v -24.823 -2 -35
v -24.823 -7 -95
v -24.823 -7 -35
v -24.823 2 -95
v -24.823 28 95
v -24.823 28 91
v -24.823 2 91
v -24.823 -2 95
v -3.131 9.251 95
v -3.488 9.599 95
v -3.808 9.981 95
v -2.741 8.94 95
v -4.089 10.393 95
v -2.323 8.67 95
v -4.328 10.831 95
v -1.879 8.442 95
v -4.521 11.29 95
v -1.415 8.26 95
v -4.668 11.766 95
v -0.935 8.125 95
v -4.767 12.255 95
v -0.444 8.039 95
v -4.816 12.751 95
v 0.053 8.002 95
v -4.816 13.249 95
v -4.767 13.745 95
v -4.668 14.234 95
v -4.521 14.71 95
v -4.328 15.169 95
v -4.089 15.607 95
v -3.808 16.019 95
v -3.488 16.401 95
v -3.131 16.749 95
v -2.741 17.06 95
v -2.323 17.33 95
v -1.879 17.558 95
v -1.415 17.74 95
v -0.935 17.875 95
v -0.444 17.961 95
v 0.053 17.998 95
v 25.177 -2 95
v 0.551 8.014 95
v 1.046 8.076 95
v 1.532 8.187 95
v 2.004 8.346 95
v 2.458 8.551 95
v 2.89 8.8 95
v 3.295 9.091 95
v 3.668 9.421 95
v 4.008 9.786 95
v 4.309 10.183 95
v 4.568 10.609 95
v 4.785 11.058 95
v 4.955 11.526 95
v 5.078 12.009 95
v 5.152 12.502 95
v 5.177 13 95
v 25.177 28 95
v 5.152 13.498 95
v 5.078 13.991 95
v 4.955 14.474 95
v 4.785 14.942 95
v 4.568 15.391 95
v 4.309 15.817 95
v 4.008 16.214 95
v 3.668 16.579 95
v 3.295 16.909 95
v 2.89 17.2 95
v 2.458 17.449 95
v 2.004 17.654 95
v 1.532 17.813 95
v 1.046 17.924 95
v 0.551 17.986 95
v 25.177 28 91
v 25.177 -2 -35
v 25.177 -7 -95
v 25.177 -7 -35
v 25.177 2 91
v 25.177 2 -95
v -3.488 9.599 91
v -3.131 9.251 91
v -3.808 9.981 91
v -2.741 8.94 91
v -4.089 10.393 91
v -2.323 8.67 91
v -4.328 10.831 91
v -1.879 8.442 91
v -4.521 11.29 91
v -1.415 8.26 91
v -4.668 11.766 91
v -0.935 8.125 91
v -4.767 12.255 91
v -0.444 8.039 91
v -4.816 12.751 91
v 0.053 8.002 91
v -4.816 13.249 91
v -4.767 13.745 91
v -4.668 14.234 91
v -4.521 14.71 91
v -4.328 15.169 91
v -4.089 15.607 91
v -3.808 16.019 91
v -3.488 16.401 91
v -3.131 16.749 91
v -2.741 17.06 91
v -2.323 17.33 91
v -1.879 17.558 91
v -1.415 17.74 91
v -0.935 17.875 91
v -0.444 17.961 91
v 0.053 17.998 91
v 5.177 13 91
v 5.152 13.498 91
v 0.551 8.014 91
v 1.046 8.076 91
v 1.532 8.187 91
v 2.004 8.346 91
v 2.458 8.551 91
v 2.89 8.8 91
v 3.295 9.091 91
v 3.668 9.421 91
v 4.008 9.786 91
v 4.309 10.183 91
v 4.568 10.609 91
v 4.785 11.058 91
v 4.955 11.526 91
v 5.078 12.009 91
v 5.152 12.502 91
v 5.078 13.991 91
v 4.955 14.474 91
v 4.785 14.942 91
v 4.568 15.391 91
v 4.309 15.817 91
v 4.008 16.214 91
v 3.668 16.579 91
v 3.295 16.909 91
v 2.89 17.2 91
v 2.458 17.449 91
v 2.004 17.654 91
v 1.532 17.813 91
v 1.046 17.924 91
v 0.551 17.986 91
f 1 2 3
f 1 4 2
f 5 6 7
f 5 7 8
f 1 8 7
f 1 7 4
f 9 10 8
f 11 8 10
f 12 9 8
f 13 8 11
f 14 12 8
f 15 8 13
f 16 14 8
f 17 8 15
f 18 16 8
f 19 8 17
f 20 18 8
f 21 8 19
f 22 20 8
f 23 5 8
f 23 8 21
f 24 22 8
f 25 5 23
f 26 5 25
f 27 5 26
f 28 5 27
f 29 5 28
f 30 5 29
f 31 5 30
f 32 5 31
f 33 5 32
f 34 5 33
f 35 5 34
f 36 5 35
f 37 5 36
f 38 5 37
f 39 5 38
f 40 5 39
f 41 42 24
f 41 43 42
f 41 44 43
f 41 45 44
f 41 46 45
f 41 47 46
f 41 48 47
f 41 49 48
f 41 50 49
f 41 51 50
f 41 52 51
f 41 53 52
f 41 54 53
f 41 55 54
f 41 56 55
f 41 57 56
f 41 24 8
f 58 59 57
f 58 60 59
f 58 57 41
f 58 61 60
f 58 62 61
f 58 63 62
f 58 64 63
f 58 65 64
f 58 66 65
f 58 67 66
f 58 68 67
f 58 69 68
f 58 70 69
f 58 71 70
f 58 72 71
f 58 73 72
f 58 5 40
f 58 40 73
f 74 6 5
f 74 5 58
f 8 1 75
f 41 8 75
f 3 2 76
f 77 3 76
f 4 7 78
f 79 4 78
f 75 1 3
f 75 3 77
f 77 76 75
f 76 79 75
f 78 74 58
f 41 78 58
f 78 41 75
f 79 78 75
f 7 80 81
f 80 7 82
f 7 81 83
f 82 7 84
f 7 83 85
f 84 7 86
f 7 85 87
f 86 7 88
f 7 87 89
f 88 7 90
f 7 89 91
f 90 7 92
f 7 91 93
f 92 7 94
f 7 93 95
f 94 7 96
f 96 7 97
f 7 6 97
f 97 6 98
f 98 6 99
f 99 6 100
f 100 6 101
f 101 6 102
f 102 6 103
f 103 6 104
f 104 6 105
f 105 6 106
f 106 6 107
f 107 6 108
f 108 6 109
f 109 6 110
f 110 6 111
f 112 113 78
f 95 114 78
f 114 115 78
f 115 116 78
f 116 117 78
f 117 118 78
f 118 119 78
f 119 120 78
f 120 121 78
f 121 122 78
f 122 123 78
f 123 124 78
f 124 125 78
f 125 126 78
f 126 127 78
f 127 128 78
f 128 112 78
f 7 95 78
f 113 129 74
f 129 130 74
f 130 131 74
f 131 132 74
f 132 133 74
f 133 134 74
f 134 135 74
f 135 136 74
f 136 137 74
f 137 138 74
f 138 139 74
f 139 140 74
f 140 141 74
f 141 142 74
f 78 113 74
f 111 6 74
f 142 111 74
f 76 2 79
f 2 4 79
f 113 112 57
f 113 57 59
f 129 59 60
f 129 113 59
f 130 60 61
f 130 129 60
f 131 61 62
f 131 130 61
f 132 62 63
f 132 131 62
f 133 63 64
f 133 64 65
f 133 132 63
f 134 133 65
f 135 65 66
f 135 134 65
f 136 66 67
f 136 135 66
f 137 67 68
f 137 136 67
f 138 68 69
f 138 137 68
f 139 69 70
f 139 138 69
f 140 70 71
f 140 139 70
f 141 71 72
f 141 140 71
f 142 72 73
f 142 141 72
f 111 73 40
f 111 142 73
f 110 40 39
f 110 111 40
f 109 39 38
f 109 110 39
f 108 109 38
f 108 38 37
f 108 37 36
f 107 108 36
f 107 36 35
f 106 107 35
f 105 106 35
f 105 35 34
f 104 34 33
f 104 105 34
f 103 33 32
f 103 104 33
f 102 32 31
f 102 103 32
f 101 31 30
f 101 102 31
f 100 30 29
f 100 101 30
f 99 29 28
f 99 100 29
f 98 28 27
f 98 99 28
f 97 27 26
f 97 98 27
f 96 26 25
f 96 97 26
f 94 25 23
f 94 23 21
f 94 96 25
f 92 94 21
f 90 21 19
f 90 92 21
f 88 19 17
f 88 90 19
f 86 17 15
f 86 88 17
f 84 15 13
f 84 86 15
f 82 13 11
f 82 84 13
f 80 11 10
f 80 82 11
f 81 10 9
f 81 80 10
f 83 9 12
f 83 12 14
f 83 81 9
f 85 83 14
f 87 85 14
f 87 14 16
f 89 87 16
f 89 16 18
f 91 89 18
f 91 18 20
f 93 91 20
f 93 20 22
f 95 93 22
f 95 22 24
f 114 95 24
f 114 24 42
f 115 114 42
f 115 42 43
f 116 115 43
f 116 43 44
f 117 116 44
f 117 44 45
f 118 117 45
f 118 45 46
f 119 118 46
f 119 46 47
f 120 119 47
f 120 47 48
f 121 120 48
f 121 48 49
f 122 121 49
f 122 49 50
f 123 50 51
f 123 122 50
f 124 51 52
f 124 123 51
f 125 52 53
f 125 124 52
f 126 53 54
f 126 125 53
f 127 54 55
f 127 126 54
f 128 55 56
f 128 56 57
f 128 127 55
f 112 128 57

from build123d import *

# Parameters (mm, degrees)
F0_W     = 50
F0_H     = 186
F1_DEPTH = 2
F2_W     = 50
F2_H     = 26
F2_R     = 5
F2_H_2   = 4
F3_DEPTH = 4
F4_W     = 50
F4_H     = 60
F5_DEPTH = 5


with BuildPart() as f1:
    # F0 (on Front) → F1 (new body, symmetric)
    with BuildSketch(Plane.XZ):
        with Locations((0.1773070544, -2)):
            Rectangle(F0_W, F0_H)
    extrude(amount=F1_DEPTH, both=True)

    # F2 (on face) → F3 (join)
    with BuildSketch(Plane.XY.offset(91)):
        with Locations((0.1773070544, 15)):
            Rectangle(F2_W, F2_H)
        with Locations((0.1773070544, 13)):
            Circle(F2_R, mode=Mode.SUBTRACT)
        with Locations((0.1773070544, 0)):
            Rectangle(F2_W, F2_H_2)
    extrude(amount=F3_DEPTH)

    # F4 (on face) → F5 (join)
    with BuildSketch(Plane.XZ.offset(2)):
        with Locations((0.1773070544, -65)):
            Rectangle(F4_W, F4_H)
    extrude(amount=F5_DEPTH)


solid = f1.part
